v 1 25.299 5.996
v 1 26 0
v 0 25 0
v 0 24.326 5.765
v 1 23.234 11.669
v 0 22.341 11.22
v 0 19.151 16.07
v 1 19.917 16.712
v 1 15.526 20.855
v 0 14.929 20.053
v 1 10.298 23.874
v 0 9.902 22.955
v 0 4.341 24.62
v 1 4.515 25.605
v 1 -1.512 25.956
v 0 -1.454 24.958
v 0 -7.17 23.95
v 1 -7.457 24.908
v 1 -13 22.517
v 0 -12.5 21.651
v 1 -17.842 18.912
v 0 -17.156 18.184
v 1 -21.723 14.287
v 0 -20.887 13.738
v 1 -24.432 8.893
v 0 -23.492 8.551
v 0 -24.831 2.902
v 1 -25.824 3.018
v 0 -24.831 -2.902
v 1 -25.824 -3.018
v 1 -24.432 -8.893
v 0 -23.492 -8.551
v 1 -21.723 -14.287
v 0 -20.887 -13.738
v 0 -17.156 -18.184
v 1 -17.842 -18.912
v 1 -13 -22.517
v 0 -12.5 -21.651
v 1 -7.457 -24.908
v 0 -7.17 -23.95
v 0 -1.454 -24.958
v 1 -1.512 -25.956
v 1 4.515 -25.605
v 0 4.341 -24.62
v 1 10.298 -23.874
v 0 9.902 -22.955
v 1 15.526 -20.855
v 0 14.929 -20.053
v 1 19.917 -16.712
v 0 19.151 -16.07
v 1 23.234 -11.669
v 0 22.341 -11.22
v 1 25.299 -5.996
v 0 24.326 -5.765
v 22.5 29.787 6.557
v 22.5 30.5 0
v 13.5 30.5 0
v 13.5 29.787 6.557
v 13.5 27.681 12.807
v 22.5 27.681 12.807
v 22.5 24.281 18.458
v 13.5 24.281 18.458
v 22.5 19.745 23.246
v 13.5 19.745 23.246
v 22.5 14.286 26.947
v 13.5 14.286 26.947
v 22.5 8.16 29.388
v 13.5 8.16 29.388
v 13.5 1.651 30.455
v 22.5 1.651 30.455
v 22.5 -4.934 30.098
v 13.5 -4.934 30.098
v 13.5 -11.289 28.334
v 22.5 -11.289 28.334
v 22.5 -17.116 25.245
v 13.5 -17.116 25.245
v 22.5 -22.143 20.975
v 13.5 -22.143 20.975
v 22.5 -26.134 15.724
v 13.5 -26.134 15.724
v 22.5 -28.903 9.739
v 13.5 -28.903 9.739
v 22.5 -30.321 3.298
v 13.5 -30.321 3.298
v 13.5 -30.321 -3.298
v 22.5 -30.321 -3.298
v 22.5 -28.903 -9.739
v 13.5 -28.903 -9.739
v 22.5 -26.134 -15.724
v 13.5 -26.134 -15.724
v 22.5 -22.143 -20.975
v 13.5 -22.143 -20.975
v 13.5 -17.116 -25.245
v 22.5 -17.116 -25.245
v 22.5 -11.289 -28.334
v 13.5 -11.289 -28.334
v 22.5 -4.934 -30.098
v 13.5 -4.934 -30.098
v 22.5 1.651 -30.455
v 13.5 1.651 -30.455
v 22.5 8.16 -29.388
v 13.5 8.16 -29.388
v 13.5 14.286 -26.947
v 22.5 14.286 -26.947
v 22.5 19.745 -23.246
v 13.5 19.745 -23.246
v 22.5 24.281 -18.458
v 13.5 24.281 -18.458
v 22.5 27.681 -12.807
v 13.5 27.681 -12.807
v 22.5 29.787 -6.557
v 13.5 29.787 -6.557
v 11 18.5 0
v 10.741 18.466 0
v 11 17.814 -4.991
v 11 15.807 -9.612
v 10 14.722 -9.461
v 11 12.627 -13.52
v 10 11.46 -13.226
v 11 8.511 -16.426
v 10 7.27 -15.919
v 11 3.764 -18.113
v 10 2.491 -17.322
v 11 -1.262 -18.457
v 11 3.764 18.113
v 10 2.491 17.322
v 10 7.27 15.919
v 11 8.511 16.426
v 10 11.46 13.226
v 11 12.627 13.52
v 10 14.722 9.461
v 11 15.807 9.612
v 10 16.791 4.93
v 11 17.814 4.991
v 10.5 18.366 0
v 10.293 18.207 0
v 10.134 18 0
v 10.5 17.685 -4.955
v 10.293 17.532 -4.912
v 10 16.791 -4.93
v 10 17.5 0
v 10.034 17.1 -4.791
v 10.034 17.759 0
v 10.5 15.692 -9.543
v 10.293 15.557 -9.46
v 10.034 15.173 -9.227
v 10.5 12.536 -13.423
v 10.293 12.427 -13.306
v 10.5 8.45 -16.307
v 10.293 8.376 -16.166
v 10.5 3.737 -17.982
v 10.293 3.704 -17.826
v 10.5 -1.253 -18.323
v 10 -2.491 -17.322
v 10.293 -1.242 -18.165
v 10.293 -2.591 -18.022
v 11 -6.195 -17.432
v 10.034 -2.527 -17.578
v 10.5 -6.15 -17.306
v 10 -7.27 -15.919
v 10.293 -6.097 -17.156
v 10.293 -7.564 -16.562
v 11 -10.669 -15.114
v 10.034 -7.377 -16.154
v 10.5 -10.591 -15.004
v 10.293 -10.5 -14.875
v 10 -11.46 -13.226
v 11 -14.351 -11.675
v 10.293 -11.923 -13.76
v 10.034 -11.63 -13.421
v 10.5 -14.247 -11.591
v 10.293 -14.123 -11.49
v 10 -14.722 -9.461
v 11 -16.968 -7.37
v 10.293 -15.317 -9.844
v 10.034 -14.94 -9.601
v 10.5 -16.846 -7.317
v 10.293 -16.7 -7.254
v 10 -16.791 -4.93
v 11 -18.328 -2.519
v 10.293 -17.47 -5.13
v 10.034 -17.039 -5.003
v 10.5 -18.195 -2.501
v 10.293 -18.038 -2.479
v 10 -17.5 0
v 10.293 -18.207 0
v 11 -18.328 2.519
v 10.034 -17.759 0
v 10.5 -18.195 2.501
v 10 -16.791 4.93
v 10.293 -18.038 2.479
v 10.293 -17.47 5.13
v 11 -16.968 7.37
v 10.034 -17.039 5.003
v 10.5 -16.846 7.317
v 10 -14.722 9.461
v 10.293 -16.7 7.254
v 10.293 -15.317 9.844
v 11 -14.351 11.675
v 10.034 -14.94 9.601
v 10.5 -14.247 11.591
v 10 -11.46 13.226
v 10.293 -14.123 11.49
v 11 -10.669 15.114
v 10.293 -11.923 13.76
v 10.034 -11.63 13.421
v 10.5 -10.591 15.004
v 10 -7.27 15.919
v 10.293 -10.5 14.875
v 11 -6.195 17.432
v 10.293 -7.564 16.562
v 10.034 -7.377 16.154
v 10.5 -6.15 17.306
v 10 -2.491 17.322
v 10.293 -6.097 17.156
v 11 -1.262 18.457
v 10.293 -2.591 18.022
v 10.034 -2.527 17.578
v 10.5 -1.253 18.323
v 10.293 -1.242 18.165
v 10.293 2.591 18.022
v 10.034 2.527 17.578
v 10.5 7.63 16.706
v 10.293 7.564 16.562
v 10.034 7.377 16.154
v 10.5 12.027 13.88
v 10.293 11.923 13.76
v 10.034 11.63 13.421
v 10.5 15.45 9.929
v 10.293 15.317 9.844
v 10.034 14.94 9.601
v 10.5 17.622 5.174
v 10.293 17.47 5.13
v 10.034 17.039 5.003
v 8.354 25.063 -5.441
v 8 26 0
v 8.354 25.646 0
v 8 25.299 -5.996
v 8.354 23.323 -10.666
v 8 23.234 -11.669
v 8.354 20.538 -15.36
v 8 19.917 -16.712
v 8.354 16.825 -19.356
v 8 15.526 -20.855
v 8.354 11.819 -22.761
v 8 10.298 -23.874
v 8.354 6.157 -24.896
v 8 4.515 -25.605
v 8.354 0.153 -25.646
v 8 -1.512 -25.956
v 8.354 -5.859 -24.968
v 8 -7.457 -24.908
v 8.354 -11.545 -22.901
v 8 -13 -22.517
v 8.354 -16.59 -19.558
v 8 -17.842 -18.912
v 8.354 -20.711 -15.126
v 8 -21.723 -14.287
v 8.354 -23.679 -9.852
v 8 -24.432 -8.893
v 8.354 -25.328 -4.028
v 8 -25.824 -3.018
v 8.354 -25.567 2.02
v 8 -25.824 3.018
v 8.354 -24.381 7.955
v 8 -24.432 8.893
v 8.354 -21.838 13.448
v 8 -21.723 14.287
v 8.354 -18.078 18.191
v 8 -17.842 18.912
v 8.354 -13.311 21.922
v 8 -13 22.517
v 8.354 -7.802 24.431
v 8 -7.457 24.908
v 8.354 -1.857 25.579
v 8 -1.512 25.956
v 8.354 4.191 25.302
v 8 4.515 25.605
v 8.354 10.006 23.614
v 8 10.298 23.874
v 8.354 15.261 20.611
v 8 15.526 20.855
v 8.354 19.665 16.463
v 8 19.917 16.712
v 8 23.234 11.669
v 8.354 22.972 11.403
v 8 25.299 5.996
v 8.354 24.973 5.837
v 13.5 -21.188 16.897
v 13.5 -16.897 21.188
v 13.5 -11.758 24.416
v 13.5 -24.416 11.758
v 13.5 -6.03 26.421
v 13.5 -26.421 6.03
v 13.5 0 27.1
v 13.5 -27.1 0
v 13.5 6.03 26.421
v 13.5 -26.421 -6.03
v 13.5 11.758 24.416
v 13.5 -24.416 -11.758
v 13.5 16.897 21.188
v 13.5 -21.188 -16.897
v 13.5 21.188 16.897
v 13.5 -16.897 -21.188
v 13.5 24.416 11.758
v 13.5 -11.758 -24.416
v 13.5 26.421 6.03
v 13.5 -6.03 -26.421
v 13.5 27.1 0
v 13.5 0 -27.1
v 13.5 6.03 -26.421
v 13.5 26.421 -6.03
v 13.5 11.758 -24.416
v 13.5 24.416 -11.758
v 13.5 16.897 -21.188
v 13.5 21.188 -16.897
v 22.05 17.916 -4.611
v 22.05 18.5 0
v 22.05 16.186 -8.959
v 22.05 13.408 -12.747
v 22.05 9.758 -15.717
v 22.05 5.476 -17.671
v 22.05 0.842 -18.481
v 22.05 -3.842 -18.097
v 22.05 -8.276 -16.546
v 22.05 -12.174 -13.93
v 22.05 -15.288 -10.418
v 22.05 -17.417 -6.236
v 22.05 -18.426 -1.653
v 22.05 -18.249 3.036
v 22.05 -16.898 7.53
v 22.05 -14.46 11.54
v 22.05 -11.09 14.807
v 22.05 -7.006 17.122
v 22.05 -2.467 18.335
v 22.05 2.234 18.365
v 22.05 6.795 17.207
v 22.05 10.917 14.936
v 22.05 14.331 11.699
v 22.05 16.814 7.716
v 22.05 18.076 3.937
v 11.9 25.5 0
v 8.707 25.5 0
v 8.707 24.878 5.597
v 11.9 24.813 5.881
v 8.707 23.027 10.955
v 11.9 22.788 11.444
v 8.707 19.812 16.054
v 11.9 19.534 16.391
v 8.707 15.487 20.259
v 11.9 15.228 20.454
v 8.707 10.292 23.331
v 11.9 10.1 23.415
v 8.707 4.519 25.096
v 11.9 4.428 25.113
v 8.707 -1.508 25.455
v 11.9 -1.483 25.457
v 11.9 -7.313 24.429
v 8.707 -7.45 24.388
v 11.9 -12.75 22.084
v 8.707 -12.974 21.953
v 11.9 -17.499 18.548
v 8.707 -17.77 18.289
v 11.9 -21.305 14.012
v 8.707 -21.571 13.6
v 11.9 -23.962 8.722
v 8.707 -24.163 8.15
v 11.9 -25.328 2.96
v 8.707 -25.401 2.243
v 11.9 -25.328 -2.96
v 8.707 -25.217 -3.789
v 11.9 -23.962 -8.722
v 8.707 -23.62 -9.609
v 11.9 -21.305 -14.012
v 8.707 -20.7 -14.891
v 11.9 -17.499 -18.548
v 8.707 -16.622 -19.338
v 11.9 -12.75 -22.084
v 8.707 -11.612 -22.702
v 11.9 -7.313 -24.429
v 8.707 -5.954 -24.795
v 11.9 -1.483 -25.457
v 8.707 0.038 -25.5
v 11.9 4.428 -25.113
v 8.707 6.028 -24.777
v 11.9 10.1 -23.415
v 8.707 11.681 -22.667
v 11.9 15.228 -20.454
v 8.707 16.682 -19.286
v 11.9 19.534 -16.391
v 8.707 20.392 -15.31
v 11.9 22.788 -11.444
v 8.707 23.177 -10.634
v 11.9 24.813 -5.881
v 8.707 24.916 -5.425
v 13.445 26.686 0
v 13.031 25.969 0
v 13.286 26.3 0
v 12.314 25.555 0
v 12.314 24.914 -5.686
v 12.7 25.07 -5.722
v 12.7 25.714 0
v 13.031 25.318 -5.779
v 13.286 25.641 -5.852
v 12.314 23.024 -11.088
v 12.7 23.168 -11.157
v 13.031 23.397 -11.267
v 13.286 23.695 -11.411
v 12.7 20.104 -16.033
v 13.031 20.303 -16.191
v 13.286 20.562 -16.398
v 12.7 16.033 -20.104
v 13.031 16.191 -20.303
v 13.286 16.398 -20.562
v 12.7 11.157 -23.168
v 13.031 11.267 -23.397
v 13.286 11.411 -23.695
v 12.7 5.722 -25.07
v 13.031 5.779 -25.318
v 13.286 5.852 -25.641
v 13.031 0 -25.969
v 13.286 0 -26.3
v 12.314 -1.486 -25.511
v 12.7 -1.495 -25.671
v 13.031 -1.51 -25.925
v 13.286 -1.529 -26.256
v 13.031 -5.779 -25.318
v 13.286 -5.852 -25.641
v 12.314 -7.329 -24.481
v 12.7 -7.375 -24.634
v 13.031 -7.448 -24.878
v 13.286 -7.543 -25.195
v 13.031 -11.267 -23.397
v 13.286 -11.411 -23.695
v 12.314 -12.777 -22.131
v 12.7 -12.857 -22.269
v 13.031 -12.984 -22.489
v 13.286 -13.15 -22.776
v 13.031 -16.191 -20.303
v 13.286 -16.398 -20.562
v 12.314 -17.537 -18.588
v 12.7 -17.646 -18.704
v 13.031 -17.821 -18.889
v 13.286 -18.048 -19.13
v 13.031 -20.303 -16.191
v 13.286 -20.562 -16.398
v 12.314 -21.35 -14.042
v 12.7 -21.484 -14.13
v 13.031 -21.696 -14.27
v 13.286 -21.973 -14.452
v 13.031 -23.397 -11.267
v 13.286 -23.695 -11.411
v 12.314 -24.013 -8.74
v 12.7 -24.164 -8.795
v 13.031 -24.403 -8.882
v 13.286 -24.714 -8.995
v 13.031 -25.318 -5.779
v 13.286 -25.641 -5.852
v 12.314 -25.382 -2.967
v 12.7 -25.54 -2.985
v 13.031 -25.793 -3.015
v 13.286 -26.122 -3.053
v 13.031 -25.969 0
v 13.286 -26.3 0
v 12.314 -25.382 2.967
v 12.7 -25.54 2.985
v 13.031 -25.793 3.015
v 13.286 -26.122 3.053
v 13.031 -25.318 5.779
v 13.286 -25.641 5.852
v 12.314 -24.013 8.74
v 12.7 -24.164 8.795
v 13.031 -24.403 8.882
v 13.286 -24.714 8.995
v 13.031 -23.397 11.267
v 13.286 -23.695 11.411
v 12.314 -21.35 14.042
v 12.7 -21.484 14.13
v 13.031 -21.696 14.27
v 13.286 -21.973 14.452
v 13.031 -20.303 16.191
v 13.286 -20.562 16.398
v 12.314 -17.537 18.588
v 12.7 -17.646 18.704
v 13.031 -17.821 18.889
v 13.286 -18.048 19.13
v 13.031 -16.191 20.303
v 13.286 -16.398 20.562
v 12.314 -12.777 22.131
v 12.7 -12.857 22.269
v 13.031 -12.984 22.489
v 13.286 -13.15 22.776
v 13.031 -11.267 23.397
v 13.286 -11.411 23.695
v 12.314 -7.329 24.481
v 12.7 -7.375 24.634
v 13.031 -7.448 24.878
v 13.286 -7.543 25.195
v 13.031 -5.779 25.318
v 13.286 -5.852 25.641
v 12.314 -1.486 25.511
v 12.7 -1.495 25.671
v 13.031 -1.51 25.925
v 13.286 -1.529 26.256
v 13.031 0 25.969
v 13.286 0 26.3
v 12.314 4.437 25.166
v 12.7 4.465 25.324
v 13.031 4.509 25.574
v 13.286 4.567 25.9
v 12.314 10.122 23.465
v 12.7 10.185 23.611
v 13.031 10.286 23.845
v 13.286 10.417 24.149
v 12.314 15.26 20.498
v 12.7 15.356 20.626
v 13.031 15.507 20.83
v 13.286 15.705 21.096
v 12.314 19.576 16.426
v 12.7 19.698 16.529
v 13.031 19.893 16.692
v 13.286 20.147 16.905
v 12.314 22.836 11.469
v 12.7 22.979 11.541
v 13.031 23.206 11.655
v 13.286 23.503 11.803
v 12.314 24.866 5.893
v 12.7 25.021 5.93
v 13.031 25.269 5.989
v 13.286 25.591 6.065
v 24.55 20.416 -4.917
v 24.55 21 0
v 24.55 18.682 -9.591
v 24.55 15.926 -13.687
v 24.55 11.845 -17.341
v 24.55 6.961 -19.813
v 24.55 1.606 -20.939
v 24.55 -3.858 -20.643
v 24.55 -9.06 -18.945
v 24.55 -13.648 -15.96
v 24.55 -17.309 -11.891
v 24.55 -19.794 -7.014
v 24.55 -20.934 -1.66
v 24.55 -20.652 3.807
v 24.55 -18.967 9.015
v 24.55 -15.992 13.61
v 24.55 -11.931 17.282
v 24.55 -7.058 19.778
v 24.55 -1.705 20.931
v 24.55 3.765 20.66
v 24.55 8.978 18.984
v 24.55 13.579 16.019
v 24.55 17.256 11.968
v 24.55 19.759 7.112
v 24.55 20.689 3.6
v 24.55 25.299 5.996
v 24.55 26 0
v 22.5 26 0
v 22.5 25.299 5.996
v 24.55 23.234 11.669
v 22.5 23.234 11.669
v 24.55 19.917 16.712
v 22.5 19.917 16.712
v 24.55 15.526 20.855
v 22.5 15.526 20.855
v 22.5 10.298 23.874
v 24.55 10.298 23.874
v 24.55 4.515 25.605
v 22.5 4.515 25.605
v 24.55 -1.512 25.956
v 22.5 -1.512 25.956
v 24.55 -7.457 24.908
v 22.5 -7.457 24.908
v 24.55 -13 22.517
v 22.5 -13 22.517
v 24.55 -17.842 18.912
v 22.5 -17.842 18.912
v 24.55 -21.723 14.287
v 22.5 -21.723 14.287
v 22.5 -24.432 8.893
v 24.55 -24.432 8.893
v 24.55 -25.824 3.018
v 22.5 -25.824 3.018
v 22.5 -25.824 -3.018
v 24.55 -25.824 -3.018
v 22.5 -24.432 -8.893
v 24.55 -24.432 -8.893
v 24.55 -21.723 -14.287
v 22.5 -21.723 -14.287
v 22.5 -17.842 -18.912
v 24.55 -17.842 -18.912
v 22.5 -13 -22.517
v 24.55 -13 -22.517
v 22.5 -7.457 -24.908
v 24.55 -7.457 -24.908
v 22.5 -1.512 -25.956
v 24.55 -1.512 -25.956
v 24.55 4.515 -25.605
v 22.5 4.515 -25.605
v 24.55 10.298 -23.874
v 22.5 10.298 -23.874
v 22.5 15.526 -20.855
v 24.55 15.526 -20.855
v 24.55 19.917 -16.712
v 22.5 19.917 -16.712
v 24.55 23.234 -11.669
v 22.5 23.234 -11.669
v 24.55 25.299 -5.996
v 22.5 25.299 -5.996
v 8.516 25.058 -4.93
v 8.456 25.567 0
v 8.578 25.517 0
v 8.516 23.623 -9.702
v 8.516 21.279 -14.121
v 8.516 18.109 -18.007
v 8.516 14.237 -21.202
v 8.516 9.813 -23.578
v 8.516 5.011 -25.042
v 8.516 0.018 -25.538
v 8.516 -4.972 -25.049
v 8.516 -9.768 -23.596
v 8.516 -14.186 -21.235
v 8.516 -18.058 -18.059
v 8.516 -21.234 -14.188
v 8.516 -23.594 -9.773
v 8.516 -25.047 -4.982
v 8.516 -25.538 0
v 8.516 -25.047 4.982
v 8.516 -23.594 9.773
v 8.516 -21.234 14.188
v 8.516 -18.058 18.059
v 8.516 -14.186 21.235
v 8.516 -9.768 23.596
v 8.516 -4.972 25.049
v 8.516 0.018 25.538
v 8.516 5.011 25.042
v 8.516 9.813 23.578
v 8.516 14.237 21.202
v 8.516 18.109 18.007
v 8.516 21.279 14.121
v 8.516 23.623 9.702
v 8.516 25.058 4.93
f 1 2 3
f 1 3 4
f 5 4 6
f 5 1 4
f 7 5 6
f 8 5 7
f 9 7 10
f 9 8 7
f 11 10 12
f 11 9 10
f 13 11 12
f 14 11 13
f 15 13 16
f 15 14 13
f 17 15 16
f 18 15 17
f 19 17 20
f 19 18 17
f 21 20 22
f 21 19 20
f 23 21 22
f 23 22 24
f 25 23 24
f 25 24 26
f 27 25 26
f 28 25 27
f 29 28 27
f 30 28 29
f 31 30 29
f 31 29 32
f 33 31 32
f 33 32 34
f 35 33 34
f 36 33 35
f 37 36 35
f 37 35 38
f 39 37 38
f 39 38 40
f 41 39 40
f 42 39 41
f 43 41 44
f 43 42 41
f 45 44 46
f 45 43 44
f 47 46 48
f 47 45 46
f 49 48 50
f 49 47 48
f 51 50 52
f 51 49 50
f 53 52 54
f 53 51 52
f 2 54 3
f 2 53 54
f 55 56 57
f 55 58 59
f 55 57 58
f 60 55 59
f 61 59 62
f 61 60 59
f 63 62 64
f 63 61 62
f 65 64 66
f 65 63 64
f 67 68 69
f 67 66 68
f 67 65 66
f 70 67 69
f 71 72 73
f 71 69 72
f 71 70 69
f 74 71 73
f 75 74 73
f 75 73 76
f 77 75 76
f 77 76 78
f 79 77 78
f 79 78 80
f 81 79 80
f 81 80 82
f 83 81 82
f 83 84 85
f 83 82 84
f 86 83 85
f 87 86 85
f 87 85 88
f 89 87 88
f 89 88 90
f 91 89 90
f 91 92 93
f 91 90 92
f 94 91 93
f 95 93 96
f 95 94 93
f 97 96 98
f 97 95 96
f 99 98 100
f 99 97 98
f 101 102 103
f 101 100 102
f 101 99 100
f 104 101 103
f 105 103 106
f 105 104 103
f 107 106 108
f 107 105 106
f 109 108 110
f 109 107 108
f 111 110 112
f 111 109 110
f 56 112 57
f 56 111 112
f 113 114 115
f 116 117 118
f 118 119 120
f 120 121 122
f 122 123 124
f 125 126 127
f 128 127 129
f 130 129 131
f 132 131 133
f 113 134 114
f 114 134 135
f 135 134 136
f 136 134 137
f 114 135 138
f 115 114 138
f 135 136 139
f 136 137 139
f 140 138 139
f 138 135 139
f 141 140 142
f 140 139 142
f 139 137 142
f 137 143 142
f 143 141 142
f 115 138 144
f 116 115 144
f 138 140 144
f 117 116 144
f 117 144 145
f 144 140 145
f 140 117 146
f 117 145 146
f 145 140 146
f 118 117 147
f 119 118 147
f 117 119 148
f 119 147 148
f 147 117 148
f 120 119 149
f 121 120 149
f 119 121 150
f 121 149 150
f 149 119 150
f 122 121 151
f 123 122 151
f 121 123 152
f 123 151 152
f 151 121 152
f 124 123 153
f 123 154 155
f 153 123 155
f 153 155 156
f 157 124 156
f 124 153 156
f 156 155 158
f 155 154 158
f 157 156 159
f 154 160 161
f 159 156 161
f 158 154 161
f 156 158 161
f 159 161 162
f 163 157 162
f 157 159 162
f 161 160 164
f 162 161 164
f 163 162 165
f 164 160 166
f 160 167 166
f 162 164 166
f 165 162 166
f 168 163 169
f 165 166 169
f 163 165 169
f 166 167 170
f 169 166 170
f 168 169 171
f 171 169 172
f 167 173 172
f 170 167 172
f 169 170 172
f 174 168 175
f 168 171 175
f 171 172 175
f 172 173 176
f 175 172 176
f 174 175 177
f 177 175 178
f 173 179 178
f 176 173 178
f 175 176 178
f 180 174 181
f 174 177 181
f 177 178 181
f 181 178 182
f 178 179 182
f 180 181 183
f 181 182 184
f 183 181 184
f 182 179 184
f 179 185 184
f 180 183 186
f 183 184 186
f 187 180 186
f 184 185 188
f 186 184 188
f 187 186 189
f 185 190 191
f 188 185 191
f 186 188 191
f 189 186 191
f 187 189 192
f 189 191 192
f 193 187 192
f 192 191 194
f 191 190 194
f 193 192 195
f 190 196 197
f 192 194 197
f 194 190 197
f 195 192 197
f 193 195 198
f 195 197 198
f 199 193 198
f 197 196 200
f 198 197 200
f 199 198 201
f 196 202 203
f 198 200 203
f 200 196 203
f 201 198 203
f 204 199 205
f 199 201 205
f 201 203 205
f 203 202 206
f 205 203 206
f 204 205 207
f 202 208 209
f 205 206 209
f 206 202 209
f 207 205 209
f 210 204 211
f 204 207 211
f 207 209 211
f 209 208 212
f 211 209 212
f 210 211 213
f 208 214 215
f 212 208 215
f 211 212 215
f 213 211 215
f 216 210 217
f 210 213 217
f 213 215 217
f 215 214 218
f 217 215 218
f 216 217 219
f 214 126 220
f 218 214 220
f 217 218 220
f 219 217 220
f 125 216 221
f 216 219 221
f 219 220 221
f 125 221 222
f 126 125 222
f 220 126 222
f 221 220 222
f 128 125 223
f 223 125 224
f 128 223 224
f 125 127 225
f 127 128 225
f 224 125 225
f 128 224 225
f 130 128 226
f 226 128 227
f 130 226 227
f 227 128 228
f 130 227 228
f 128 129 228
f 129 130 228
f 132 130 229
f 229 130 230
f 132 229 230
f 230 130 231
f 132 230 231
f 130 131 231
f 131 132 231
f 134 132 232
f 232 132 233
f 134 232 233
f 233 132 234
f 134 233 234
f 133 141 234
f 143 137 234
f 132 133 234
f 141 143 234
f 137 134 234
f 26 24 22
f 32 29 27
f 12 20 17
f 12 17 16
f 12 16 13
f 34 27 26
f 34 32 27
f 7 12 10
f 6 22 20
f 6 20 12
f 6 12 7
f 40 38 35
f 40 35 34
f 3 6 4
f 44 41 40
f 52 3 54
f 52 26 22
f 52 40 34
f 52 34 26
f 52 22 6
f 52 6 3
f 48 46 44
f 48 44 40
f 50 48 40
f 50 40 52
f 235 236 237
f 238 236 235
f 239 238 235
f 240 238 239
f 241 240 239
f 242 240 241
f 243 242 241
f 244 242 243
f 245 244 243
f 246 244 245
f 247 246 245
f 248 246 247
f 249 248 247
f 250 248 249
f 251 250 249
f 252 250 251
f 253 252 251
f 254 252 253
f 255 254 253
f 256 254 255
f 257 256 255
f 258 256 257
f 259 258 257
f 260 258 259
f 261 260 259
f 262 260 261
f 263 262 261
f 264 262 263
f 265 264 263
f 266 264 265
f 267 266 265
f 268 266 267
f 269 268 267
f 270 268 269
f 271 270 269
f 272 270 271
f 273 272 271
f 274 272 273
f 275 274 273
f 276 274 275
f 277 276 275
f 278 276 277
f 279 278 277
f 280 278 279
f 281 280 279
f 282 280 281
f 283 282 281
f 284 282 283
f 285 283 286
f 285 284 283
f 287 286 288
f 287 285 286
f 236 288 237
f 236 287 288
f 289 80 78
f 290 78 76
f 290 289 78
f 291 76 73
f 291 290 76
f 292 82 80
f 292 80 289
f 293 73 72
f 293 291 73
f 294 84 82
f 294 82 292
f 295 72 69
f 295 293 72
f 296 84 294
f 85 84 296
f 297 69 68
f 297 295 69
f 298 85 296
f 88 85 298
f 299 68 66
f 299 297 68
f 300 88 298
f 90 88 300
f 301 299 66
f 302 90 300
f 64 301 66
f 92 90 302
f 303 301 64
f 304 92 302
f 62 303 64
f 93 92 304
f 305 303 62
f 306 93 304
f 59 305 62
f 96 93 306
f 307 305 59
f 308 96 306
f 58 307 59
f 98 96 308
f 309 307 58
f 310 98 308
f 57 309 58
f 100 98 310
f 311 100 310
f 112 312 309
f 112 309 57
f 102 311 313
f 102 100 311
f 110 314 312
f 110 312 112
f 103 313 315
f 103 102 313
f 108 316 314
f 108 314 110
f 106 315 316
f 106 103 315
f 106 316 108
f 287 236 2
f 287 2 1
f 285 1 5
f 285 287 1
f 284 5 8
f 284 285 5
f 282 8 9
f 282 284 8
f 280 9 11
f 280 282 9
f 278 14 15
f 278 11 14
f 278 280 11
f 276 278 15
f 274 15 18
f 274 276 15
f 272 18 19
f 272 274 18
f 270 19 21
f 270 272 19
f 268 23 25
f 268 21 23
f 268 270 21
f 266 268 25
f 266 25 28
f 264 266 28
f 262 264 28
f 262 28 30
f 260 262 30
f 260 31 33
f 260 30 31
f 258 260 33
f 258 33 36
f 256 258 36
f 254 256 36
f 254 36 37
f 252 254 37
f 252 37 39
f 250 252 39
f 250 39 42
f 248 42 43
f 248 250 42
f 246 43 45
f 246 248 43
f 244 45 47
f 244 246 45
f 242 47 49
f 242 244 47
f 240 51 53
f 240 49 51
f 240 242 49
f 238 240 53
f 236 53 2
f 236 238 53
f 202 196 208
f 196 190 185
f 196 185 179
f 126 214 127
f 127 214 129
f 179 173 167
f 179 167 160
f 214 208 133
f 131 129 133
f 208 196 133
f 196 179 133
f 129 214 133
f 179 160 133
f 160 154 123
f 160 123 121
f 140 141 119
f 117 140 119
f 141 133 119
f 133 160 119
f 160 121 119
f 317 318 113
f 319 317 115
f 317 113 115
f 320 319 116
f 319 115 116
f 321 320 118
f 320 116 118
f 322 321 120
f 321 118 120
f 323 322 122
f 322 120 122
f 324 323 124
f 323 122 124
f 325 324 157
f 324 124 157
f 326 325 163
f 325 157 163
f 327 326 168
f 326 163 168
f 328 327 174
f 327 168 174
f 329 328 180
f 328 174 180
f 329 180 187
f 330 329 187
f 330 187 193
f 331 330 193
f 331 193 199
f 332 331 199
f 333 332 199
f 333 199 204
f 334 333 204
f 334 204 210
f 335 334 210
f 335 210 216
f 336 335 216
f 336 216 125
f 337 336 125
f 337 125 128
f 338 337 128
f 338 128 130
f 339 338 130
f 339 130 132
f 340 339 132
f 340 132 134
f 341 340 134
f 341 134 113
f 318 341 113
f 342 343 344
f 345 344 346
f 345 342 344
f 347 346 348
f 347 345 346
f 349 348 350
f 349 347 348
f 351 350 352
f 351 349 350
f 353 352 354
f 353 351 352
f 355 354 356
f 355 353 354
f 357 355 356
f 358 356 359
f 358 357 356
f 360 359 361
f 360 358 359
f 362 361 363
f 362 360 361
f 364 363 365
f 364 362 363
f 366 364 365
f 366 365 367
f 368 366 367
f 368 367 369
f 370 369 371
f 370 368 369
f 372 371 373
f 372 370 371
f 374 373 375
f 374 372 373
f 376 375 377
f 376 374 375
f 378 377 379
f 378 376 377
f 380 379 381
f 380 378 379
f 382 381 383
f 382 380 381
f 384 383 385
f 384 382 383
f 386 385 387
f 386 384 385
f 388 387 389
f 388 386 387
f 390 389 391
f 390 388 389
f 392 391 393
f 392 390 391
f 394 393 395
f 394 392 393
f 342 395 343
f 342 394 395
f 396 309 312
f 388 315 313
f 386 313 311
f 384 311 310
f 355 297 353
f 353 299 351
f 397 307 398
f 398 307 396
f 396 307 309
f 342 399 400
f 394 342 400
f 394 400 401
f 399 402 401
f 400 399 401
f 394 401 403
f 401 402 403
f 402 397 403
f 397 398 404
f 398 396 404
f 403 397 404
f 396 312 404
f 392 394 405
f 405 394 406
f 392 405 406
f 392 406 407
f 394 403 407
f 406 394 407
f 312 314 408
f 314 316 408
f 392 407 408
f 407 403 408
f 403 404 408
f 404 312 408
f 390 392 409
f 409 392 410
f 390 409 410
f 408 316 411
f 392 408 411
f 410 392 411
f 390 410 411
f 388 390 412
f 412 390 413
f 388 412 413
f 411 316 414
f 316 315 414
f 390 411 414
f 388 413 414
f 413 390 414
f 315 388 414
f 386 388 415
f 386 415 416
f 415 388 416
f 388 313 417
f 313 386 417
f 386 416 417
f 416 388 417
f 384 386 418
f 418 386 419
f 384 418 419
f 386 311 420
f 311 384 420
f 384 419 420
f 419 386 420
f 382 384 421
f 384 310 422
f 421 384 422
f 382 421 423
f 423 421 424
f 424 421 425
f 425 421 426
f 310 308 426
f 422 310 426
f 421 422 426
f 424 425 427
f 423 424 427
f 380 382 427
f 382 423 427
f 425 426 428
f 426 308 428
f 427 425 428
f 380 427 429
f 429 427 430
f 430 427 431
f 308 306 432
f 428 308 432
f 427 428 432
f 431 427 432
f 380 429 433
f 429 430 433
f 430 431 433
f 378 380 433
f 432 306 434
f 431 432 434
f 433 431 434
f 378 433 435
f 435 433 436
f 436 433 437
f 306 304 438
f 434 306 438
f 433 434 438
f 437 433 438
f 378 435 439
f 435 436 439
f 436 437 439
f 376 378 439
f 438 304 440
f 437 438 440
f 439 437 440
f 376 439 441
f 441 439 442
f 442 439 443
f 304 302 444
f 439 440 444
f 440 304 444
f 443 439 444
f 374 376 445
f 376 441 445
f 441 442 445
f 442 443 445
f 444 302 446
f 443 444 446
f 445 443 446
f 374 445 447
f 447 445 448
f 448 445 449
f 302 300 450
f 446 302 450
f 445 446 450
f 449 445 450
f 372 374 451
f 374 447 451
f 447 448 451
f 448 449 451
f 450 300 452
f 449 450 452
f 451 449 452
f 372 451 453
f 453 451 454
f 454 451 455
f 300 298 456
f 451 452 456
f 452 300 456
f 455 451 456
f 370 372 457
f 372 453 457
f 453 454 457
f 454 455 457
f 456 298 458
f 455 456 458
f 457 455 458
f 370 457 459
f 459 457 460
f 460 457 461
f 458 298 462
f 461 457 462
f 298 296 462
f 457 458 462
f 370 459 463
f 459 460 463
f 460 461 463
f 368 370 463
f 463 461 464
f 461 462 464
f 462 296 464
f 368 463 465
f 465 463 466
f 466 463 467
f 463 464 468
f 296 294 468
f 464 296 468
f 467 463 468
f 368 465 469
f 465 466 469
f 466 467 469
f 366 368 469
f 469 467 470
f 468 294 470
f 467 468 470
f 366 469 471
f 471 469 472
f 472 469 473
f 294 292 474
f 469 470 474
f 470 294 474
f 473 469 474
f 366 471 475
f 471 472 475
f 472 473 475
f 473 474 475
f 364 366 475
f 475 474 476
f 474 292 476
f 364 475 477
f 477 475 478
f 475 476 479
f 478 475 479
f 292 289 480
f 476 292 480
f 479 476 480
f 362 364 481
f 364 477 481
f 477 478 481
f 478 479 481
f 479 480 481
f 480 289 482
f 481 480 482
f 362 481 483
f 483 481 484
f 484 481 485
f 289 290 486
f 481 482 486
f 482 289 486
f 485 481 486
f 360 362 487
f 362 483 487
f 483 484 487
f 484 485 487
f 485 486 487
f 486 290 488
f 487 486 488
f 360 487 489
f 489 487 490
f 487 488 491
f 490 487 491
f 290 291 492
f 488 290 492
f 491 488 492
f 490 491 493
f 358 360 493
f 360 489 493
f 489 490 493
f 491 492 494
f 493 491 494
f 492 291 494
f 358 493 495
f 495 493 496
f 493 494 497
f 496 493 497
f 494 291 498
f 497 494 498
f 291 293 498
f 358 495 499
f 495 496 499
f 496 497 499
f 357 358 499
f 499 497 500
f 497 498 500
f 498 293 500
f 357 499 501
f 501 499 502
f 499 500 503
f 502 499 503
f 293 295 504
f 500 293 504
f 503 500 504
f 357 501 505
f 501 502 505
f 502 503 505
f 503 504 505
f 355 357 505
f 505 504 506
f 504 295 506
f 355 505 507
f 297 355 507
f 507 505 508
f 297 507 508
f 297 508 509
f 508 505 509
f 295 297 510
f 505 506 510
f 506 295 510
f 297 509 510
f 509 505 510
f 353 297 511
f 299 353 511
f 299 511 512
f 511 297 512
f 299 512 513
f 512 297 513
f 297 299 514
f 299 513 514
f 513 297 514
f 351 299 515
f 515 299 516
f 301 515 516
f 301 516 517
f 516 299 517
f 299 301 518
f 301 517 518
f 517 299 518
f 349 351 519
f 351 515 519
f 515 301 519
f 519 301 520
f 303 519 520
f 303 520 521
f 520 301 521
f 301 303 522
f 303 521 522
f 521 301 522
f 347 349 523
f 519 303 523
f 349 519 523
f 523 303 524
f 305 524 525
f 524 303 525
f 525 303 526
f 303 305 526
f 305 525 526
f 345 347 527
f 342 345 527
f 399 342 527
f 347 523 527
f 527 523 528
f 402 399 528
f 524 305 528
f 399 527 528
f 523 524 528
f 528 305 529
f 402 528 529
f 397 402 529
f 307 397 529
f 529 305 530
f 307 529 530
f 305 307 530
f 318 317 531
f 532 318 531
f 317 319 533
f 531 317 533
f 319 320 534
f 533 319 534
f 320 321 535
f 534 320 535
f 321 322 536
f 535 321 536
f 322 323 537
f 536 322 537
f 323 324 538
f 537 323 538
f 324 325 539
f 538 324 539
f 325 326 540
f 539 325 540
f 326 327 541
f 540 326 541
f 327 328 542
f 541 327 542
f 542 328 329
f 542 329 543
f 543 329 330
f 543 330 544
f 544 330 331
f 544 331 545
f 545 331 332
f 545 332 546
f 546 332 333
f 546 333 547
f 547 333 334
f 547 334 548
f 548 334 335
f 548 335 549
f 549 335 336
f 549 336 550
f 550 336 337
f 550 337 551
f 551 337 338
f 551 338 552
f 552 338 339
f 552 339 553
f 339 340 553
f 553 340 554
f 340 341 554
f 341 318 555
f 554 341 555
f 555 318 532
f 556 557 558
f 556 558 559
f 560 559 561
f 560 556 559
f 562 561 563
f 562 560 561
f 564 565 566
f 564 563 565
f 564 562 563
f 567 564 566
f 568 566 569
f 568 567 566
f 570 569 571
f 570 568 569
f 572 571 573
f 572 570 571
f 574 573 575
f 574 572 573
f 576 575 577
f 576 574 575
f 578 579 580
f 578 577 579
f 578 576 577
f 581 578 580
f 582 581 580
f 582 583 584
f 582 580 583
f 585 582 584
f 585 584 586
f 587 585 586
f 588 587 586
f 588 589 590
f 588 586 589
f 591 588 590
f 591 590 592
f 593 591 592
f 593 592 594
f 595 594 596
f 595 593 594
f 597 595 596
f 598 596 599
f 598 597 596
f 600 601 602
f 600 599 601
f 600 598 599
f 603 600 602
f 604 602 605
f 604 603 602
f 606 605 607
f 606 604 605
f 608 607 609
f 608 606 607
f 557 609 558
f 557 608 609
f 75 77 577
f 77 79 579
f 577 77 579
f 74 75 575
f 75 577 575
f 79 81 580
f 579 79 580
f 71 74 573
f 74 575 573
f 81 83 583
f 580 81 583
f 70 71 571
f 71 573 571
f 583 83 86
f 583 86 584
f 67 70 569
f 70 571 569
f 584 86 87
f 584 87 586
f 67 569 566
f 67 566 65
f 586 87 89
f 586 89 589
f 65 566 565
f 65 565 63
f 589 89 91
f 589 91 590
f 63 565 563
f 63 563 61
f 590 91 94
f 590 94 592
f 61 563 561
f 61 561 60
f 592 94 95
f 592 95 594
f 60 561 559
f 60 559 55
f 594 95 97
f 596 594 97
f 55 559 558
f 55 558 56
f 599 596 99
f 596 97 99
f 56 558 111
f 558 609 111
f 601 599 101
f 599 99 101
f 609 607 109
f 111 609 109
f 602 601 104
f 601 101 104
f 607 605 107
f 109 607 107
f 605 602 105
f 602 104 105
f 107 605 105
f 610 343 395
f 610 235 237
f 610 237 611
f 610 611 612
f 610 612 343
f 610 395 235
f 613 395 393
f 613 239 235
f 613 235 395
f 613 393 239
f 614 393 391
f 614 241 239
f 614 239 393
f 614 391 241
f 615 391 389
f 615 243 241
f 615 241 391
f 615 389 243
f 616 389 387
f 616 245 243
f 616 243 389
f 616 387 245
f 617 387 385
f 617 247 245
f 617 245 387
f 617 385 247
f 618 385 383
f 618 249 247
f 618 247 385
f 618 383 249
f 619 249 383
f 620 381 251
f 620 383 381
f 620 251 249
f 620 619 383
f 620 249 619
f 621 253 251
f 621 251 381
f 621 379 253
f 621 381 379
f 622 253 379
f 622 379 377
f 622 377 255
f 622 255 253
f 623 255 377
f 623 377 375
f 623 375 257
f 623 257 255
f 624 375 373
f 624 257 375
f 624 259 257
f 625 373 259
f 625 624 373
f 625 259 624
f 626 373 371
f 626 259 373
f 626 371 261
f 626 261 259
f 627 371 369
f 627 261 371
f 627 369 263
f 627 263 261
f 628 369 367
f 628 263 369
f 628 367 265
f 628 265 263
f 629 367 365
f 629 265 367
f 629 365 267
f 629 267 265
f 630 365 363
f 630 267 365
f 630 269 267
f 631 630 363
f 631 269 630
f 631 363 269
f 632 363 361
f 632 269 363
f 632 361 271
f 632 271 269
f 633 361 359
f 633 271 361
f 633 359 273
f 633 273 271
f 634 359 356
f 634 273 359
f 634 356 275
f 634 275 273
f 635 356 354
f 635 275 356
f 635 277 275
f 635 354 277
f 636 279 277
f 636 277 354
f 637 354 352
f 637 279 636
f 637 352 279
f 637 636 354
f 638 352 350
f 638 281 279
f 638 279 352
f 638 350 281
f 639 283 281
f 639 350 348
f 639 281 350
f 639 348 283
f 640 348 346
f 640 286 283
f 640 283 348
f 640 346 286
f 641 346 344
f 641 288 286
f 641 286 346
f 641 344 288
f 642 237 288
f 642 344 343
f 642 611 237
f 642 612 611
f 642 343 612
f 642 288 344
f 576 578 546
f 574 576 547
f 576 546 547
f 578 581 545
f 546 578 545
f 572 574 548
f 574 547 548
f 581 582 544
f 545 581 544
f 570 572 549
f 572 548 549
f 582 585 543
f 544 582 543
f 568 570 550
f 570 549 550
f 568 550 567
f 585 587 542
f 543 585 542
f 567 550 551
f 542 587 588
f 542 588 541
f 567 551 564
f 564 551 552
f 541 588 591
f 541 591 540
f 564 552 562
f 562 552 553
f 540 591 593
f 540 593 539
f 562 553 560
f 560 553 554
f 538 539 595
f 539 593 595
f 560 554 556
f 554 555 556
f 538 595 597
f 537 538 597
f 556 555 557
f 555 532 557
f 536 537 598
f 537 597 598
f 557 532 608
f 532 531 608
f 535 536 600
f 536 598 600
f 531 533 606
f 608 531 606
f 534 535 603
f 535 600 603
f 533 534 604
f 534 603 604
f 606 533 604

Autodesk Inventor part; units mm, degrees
ref_plane "YZ Plane" through (0, 0, 0) normal (1, 0, 0) x (0, 1, 0)
ref_plane "XZ Plane" through (0, 0, 0) normal (0, 1, 0) x (-1, 0, 0)
ref_plane "XY Plane" through (0, 0, 0) normal (0, 0, 1) x (1, 0, 0)
sketch "Эскиз1" plane through (0, 0, 0) normal (0, 0, 1) x (1, 0, 0)
  line L0 (0, 0) -> (0, 26)
  line L1 (0, 26) -> (8, 26)
  line L2 (8, 26) -> (8.5, 25.5)
  line L3 (8.5, 25.5) -> (13.5, 25.5)
  line L4 (13.5, 25.5) -> (13.5, 30.5)
  line L5 (13.5, 30.5) -> (22.5, 30.5)
  line L6 (22.5, 30.5) -> (22.5, 26)
  line L7 (22.5, 18.5) -> (10, 18.5)
  line L8 (10, 18.5) -> (10, 0)
  line L9 (10, 0) -> (0, 0)
  line L10 (22.5, 26) -> (24.55, 26)
  line L11 (24.55, 26) -> (24.55, 18.5)
  line L12 (24.55, 18.5) -> (22.5, 18.5)
  dimension "d0" = 52
  dimension "d1" = 0.5
  dimension "d2" = 45
  dimension "d3" = 5
  dimension "d4" = 8
  dimension "d5" = 12
  dimension "d6" = 10
  dimension "d7" = 9
  dimension "d8" = 4.5
  dimension "d19" = 22.5
  dimension "d23" = 2.05
revolve "Вращение1" add sketch "Эскиз1" angle 360 about axis through (10, 0, 0) along (-1, 0, 0)
fillet "Сопряжение1" radius 0.5 1 edges at (8.5, -25.5, 0)
fillet "Сопряжение2" radius 1.6 1 edges at (13.5, -25.5, 0)
chamfer "Фаска1" distance 1 angle 45 1 edges at (0, -26, 0)
fillet "Сопряжение3" radius 1 1 edges at (10, -18.5, 0)
chamfer "Фаска4" distance 2.5 angle 45 1 edges at (24.55, -18.5, 0)
equation "\"d5\" = 1.5 * d4"
equation "\"d8\" = 0.5 * d7"
properties part number "Крышка_пром"
